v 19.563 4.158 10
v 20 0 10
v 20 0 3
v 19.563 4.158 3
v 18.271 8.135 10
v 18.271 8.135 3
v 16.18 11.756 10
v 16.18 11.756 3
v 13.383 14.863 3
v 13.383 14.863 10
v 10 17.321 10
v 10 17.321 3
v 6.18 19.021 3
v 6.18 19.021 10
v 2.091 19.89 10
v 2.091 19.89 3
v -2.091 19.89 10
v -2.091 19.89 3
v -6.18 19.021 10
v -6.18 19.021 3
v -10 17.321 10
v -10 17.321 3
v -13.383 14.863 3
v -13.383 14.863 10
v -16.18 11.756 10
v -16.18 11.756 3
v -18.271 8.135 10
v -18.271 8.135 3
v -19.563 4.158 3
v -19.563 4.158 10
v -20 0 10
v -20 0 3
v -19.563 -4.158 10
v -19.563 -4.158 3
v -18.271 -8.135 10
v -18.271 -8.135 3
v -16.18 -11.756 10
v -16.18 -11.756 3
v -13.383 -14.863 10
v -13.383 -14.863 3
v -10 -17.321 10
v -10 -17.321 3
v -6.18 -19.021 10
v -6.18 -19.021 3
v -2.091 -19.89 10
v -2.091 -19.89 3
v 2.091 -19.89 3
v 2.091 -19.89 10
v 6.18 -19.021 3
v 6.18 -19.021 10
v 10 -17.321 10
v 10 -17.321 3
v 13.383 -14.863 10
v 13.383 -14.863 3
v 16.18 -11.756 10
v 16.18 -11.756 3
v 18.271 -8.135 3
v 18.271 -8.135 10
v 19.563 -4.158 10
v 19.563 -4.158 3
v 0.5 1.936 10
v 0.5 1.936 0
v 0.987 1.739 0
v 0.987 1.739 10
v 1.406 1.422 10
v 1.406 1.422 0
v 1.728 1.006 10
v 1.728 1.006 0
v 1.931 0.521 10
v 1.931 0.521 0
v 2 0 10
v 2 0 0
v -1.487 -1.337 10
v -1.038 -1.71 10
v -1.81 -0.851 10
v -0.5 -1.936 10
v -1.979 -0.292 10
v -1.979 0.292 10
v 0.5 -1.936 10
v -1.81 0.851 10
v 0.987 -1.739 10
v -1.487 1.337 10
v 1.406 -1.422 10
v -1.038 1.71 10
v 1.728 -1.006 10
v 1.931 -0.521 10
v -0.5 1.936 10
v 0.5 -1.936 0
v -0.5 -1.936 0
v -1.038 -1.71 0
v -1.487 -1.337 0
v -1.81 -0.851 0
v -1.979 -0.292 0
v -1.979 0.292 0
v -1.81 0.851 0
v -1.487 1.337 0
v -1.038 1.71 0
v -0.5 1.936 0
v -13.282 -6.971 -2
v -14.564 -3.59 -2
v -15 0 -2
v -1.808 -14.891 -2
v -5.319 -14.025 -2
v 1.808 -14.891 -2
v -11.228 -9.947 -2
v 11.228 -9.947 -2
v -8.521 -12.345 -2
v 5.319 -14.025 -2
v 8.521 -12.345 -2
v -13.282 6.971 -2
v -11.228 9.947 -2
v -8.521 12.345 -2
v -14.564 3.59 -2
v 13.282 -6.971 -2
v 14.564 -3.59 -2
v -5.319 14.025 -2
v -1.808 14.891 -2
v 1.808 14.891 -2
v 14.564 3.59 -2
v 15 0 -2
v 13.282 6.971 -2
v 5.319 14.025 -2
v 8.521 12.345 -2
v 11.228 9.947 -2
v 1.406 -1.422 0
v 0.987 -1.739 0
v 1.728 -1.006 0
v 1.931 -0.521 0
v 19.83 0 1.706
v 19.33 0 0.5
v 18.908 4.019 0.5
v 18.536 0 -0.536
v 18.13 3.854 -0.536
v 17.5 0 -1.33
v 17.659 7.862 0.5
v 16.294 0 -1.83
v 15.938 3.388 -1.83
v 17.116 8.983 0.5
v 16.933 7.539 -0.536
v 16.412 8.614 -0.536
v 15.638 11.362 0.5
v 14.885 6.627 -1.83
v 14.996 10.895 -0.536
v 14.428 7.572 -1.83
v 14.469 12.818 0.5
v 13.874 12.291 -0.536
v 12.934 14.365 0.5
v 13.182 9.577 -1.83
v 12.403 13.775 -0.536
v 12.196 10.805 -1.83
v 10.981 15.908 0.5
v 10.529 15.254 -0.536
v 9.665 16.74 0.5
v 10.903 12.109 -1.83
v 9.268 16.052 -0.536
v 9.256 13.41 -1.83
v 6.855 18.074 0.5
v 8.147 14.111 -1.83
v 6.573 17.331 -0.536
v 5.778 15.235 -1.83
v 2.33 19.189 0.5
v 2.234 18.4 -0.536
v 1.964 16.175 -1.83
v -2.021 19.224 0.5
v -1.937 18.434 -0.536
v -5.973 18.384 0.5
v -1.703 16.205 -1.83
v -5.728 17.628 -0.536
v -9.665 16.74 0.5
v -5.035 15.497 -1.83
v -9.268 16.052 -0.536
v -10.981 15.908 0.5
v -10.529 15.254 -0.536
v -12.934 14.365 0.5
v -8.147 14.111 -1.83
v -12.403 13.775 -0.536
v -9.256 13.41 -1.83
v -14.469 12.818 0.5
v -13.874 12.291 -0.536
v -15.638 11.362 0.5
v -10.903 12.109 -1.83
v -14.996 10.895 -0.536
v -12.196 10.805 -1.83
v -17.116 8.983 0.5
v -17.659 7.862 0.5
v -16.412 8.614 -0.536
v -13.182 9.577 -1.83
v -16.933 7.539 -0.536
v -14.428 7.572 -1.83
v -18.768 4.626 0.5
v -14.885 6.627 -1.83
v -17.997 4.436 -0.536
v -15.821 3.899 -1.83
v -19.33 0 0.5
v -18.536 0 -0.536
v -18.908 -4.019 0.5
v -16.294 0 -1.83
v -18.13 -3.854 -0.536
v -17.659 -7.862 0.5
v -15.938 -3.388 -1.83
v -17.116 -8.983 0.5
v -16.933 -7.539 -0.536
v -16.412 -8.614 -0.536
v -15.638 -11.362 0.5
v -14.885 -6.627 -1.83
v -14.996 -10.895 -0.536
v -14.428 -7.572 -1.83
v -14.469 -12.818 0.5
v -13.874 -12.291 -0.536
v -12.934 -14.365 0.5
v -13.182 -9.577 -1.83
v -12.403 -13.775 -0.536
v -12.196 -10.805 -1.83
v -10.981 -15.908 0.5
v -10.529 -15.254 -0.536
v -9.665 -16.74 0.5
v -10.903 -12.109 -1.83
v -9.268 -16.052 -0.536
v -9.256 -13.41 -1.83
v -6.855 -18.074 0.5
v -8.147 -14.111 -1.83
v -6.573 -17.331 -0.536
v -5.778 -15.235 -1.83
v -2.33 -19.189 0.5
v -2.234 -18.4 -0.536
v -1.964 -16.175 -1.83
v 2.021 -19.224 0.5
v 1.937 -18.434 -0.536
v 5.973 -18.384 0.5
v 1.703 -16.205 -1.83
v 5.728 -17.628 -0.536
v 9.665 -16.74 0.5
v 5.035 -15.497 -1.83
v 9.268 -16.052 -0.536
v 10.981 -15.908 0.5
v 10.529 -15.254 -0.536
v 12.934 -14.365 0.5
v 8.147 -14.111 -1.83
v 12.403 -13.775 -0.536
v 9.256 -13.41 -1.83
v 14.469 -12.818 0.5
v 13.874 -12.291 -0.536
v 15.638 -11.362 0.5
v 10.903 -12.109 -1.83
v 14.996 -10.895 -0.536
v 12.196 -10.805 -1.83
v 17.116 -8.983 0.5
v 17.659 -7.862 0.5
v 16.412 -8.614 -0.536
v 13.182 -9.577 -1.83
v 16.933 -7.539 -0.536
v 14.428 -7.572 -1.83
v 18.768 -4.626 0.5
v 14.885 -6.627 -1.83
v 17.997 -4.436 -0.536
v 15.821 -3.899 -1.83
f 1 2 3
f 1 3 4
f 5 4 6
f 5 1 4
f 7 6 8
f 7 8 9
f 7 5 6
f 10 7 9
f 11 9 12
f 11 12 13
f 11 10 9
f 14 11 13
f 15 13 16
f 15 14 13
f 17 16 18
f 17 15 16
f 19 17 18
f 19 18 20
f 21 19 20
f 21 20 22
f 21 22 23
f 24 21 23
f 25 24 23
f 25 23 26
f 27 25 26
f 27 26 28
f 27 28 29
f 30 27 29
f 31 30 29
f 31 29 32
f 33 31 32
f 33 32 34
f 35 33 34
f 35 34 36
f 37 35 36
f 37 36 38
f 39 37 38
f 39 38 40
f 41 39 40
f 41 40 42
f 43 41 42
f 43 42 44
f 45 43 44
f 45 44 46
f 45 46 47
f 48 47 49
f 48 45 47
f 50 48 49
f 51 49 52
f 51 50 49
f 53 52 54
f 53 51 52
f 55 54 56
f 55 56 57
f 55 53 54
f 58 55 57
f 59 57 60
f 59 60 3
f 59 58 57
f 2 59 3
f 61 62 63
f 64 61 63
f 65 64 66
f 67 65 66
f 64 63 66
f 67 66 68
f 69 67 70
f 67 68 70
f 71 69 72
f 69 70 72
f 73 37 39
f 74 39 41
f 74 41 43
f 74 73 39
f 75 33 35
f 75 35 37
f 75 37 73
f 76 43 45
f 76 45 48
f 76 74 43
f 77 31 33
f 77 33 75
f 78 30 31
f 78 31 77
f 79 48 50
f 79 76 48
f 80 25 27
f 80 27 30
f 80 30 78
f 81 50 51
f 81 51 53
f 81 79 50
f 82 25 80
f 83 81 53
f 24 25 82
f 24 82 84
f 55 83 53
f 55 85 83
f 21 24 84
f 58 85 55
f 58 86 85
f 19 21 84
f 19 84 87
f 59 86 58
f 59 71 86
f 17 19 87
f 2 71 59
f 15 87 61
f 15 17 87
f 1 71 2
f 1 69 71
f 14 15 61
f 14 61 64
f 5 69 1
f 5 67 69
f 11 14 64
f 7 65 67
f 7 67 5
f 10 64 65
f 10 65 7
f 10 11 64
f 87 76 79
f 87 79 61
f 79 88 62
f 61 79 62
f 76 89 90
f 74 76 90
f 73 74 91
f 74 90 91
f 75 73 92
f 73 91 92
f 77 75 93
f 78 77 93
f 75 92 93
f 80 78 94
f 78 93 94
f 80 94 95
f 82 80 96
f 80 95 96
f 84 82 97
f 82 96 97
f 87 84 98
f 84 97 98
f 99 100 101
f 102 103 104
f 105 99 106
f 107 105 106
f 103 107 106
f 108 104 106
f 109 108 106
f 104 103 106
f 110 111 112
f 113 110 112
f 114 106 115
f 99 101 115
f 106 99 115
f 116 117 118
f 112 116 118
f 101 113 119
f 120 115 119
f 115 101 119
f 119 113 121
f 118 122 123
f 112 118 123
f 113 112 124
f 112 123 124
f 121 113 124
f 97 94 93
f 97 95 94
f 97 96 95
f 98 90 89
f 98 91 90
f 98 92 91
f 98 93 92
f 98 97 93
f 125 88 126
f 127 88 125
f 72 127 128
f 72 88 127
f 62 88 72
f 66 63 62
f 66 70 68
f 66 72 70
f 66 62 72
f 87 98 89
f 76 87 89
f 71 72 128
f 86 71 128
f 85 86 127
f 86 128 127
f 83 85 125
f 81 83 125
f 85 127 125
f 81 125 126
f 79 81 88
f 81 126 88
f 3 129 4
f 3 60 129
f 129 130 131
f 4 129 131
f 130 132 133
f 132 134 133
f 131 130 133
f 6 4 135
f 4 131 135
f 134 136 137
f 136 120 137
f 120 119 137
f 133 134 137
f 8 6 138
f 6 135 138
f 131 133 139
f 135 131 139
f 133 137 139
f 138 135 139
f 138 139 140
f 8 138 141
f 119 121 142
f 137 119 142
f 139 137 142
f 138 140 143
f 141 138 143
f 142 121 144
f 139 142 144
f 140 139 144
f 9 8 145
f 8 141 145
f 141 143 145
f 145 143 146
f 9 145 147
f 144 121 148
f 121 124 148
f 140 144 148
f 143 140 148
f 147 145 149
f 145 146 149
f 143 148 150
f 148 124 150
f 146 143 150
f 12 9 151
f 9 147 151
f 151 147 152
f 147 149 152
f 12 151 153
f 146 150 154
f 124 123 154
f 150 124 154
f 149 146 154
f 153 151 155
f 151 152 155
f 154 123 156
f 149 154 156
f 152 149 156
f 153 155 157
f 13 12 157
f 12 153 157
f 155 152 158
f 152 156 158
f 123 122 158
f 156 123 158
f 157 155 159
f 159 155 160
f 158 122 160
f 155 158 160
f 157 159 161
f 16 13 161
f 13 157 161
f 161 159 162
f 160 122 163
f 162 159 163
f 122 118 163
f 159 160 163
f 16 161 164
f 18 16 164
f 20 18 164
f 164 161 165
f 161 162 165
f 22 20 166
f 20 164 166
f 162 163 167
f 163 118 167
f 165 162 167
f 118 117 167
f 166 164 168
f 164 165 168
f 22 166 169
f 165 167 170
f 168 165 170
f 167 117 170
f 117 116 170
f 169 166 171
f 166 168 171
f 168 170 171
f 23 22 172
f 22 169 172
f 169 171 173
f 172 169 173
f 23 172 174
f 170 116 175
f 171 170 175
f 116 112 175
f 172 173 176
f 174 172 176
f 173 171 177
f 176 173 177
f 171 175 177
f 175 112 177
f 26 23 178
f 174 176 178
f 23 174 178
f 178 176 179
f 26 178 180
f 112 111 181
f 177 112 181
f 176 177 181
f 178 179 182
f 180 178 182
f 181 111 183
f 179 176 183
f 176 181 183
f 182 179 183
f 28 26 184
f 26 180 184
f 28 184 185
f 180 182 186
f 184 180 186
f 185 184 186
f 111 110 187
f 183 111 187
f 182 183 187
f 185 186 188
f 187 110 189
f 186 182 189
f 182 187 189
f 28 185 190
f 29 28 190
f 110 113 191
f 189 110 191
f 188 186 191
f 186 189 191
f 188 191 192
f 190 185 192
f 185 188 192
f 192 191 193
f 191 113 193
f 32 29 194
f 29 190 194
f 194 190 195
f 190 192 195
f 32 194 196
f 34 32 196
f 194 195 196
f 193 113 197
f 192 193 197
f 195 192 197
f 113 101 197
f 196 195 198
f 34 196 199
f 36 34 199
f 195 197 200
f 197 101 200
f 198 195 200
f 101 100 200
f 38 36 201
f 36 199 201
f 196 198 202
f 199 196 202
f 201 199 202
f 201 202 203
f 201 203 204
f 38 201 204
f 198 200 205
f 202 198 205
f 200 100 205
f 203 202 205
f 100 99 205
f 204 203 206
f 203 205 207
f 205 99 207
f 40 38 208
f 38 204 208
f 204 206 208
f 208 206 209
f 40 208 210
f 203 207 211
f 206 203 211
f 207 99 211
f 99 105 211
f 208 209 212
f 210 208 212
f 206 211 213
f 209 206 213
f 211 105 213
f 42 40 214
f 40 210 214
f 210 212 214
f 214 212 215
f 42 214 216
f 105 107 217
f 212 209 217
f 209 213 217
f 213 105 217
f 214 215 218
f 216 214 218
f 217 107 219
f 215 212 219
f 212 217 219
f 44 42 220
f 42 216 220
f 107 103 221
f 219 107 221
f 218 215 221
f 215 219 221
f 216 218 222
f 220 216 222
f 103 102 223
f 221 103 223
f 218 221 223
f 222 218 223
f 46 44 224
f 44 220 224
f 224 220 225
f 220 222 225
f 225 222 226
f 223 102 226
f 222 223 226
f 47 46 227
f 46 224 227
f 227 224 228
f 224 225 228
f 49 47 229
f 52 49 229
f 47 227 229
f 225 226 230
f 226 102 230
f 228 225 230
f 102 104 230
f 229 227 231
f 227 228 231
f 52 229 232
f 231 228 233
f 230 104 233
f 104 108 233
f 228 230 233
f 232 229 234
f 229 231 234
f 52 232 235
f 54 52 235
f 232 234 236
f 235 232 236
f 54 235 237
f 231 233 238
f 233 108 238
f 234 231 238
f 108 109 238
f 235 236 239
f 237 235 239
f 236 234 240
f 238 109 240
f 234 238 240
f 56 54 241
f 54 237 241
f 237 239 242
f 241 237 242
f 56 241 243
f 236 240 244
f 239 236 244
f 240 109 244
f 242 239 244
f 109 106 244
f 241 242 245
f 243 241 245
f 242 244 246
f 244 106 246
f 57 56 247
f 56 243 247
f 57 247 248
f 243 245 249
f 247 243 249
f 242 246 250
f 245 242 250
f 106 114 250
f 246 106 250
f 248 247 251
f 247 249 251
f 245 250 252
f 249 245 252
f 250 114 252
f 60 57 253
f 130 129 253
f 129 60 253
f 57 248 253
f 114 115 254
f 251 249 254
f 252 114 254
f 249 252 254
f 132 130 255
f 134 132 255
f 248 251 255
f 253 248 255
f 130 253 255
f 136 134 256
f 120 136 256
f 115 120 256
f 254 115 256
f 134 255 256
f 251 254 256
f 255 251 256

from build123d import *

# Parameters (mm, degrees)
F0_R     = 20
F1_DEPTH = 10
F2_DEPTH = 2
F3_R     = 5


with BuildPart() as f1:
    # F0 (on Top) → F1 (new body)
    with BuildSketch(Plane.XY):
        Circle(F0_R)
        with BuildLine():
            ThreePointArc((0.5, 1.936492), (1.581139, 1.224745), (2, 0))
            ThreePointArc((2, 0), (1.581139, -1.224745), (0.5, -1.936492))
            ThreePointArc((0.5, -1.936492), (0, -2), (-0.5, -1.936492))
            ThreePointArc((-0.5, -1.936492), (-2, 0), (-0.5, 1.936492))
            ThreePointArc((-0.5, 1.936492), (0, 2), (0.5, 1.936492))
        make_face(mode=Mode.SUBTRACT)
        with BuildLine():
            Line((0.5, 0), (0.5, 1.936492))
            ThreePointArc((0.5, 1.936492), (0, 2), (-0.5, 1.936492))
            Line((-0.5, 1.936492), (-0.5, 0))
            Line((-0.5, 0), (-0.5, -1.936492))
            ThreePointArc((-0.5, -1.936492), (0, -2), (0.5, -1.936492))
            Line((0.5, -1.936492), (0.5, 0))
        make_face()
    extrude(amount=F1_DEPTH)

    # F0 (on Top) → F2 (join)
    with BuildSketch(Plane.XY):
        Circle(F0_R)
        with BuildLine():
            ThreePointArc((0.5, 1.936492), (1.581139, 1.224745), (2, 0))
            ThreePointArc((2, 0), (1.581139, -1.224745), (0.5, -1.936492))
            ThreePointArc((0.5, -1.936492), (0, -2), (-0.5, -1.936492))
            ThreePointArc((-0.5, -1.936492), (-2, 0), (-0.5, 1.936492))
            ThreePointArc((-0.5, 1.936492), (0, 2), (0.5, 1.936492))
        make_face(mode=Mode.SUBTRACT)
        with BuildLine():
            ThreePointArc((0.5, -1.936492), (1.581139, -1.224745), (2, 0))
            ThreePointArc((2, 0), (1.581139, 1.224745), (0.5, 1.936492))
            Line((0.5, 1.936492), (0.5, 0))
            Line((0.5, 0), (0.5, -1.936492))
        make_face()
        with BuildLine():
            Line((-0.5, 0), (-0.5, 1.936492))
            ThreePointArc((-0.5, 1.936492), (-2, 0), (-0.5, -1.936492))
            Line((-0.5, -1.936492), (-0.5, 0))
        make_face()
        with BuildLine():
            Line((0.5, 0), (0.5, 1.936492))
            ThreePointArc((0.5, 1.936492), (0, 2), (-0.5, 1.936492))
            Line((-0.5, 1.936492), (-0.5, 0))
            Line((-0.5, 0), (-0.5, -1.936492))
            ThreePointArc((-0.5, -1.936492), (0, -2), (0.5, -1.936492))
            Line((0.5, -1.936492), (0.5, 0))
        make_face()
    extrude(amount=-F2_DEPTH)

    # F3
    f3_edges = [f1.edges().sort_by_distance(p)[0] for p in [
        (-20, 0, -2),
    ]]
    fillet(f3_edges, radius=F3_R)


solid = f1.part
